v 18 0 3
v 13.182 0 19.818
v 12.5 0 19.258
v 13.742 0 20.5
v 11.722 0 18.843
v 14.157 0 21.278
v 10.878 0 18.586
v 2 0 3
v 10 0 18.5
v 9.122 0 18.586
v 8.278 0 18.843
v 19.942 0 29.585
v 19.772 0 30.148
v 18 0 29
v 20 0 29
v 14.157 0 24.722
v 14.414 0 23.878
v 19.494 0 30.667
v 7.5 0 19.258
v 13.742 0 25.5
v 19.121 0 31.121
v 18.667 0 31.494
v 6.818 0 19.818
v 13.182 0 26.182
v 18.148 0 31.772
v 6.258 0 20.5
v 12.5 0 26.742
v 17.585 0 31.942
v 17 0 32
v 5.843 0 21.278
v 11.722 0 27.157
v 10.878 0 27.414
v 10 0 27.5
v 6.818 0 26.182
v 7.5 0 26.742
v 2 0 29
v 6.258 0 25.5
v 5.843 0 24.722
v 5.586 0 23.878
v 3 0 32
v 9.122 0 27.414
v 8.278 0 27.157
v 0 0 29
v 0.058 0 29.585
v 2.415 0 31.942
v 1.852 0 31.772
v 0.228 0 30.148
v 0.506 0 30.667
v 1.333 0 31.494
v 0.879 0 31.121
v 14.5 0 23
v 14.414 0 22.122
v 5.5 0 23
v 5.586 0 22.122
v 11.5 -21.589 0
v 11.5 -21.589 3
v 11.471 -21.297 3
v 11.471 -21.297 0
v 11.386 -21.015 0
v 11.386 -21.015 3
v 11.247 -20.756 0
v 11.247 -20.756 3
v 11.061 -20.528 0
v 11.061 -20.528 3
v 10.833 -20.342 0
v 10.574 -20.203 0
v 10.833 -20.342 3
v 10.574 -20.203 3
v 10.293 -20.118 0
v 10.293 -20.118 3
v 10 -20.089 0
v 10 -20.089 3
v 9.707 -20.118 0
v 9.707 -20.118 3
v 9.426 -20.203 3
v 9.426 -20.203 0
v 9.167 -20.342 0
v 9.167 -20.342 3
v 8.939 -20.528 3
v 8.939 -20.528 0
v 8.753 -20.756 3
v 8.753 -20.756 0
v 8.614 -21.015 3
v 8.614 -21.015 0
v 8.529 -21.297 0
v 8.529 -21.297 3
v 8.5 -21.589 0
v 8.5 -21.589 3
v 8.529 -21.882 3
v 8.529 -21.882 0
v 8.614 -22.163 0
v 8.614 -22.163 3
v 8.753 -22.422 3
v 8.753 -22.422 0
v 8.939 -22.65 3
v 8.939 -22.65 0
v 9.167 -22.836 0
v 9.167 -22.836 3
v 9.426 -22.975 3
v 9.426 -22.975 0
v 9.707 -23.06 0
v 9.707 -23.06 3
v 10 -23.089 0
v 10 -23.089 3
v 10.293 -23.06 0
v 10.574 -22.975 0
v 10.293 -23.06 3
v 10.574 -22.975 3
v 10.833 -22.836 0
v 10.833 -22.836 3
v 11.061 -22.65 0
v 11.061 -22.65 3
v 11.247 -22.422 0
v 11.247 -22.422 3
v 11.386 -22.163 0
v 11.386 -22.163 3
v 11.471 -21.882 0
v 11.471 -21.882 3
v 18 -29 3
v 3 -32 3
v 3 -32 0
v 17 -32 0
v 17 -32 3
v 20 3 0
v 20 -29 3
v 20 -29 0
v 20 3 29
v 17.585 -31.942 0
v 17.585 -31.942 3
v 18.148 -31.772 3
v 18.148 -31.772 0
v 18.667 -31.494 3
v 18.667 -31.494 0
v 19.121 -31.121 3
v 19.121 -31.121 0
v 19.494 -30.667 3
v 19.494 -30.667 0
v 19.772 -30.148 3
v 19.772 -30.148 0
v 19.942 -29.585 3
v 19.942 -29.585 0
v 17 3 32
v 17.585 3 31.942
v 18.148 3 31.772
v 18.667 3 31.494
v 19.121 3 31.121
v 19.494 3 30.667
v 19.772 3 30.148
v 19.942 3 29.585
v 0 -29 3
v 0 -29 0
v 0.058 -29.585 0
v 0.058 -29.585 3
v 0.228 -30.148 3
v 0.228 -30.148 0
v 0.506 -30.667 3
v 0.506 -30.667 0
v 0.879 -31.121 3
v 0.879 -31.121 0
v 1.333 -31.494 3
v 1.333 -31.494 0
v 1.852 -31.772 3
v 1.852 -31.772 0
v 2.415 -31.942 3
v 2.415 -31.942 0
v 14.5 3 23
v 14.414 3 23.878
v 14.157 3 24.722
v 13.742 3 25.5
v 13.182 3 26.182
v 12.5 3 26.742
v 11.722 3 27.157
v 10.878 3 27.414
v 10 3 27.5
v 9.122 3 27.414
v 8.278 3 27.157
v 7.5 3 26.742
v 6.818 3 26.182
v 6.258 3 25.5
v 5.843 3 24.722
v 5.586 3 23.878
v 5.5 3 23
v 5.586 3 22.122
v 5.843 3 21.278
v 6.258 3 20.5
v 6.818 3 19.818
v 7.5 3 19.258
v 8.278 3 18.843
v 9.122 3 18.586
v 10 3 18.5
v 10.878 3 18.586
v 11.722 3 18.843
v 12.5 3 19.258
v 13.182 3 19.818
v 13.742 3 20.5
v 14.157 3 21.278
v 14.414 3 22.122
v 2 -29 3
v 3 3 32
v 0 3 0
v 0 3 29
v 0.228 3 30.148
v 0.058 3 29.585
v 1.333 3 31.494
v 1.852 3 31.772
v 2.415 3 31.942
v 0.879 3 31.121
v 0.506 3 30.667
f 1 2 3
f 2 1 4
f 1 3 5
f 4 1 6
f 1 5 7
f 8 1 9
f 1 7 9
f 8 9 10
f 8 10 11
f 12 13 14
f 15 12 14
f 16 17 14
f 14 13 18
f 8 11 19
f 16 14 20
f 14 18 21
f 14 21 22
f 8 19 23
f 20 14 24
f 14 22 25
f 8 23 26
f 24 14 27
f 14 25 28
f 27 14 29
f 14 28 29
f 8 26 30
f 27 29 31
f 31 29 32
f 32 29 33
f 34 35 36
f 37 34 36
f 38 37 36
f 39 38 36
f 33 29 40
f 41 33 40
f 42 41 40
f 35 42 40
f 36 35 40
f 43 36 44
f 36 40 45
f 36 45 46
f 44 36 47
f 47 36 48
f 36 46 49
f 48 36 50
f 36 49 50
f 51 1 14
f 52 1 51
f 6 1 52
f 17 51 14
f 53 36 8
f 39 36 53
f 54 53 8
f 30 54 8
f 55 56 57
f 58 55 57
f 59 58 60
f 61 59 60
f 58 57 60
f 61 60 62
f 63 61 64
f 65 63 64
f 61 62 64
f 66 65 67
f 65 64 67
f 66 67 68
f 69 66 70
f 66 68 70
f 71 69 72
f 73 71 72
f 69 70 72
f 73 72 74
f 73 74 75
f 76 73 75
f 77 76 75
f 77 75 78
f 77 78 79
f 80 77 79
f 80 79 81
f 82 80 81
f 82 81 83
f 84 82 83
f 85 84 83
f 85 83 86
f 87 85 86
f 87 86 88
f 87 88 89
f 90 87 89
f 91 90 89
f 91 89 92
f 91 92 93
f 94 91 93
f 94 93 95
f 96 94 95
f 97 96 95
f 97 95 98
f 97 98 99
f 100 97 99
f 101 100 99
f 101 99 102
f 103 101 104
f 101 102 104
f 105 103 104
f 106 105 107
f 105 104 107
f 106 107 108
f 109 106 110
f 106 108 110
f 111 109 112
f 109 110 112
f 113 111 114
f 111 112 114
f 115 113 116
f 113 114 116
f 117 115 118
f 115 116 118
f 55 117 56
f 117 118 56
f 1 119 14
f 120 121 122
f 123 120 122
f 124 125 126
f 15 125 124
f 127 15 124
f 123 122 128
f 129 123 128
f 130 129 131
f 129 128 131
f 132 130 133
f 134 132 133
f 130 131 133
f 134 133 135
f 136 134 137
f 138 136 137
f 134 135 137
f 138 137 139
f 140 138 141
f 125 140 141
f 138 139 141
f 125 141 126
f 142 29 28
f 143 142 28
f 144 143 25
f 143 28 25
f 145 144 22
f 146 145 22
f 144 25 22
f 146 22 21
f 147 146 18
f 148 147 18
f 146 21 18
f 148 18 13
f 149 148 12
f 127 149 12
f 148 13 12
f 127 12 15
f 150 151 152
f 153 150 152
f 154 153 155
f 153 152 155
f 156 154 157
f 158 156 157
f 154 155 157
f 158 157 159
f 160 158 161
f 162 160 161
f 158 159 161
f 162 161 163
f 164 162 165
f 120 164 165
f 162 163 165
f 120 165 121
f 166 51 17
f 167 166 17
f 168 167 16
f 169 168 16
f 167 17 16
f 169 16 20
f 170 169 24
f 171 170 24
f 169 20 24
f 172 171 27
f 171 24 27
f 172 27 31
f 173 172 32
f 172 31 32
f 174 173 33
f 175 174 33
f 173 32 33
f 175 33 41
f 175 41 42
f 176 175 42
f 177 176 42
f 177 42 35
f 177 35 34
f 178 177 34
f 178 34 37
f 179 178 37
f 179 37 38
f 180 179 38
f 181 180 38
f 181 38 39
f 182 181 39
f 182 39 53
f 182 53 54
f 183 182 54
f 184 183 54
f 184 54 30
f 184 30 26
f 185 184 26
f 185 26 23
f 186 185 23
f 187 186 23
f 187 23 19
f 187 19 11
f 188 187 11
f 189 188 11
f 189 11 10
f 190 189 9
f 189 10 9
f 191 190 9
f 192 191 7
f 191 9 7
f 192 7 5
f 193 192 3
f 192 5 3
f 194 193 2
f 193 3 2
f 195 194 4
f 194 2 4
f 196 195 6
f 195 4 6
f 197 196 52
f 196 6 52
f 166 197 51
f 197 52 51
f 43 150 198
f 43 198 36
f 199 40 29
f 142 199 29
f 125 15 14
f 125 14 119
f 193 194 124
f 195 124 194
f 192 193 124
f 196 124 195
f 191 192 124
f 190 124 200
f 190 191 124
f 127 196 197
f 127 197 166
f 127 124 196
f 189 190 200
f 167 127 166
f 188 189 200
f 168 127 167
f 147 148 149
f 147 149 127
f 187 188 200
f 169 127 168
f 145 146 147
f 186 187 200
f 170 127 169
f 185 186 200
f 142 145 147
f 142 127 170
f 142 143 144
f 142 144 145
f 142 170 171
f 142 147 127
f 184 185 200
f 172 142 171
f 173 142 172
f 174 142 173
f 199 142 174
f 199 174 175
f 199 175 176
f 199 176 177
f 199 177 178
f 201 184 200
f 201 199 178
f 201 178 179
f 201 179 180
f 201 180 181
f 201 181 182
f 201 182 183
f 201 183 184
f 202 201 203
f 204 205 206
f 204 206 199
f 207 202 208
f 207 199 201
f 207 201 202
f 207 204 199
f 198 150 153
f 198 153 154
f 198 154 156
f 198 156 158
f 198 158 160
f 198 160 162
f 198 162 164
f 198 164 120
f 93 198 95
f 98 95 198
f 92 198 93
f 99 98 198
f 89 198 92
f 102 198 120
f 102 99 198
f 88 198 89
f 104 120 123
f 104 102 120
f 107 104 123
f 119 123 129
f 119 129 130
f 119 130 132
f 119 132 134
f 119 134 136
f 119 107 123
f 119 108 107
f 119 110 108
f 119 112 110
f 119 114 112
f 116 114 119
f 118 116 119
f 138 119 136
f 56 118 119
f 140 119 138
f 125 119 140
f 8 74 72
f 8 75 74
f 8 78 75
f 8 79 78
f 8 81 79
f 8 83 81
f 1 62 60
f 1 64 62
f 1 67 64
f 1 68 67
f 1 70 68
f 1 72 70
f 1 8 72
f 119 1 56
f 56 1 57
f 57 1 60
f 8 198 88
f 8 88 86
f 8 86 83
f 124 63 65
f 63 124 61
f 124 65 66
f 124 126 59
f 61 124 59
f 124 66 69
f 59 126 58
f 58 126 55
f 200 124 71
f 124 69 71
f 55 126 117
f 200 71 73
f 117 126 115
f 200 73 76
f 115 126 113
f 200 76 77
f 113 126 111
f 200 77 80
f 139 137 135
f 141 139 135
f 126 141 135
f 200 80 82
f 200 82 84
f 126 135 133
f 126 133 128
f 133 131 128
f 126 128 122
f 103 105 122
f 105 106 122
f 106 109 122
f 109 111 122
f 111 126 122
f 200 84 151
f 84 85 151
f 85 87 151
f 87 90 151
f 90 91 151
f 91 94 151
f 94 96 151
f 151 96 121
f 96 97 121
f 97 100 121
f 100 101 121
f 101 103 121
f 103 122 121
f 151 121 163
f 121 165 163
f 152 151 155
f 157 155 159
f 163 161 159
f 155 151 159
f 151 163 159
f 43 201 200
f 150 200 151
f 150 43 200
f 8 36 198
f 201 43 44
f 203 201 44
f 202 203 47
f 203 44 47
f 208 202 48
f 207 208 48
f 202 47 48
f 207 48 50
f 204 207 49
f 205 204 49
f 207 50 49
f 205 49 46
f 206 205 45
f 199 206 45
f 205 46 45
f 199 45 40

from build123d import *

# Parameters (mm, degrees)
F1_DEPTH  = 3
F3_DEPTH  = 3
F5_DEPTH  = 2
F7_DEPTH  = 2
F8_R      = 1.5
F9_DEPTH  = 25
F10_R     = 4.5
F11_DEPTH = 25


with BuildPart() as f1:
    # F0 (on Top) → F1 (new body)
    with BuildSketch(Plane.XY):
        with BuildLine():
            Line((20, 0), (0, 0))
            Line((0, 0), (0, -29))
            ThreePointArc((0, -29), (0.87868, -31.12132), (3, -32))
            Line((3, -32), (17, -32))
            ThreePointArc((17, -32), (19.12132, -31.12132), (20, -29))
            Line((20, -29), (20, 0))
        make_face()
    extrude(amount=F1_DEPTH)

    # F2 (on face) → F3 (join)
    with BuildSketch(Plane(origin=(0, 0, 0), x_dir=(-1, 0, 0), z_dir=(0, 1, 0))):
        with BuildLine():
            Line((-20, 0), (0, 0))
            Line((0, 0), (0, 29))
            ThreePointArc((0, 29), (-0.87868, 31.12132), (-3, 32))
            Line((-3, 32), (-17, 32))
            ThreePointArc((-17, 32), (-19.12132, 31.12132), (-20, 29))
            Line((-20, 29), (-20, 0))
        make_face()
    extrude(amount=F3_DEPTH)

    # F4 (on face) → F5 (join)
    with BuildSketch(Plane(origin=(0, 0, 0), x_dir=(0, -1, 0), z_dir=(-1, 0, 0))):
        Polygon((29, 3), (0, 29), (0, 3), align=None)
    extrude(amount=-F5_DEPTH)

    # F6 (on face) → F7 (join)
    with BuildSketch(Plane.YZ.offset(20)):
        Polygon((0, 3), (0, 29), (-29, 3), align=None)
    extrude(amount=-F7_DEPTH)

    # F8 (on face) → F9 (cut)
    with BuildSketch(Plane.XY.offset(3)):
        with Locations((10, -21.589138)):
            Circle(F8_R)
    extrude(amount=-F9_DEPTH, mode=Mode.SUBTRACT)

    # F10 (on face) → F11 (cut)
    with BuildSketch(Plane.XZ):
        with Locations((10, 23)):
            Circle(F10_R)
    extrude(amount=-F11_DEPTH, mode=Mode.SUBTRACT)


solid = f1.part
